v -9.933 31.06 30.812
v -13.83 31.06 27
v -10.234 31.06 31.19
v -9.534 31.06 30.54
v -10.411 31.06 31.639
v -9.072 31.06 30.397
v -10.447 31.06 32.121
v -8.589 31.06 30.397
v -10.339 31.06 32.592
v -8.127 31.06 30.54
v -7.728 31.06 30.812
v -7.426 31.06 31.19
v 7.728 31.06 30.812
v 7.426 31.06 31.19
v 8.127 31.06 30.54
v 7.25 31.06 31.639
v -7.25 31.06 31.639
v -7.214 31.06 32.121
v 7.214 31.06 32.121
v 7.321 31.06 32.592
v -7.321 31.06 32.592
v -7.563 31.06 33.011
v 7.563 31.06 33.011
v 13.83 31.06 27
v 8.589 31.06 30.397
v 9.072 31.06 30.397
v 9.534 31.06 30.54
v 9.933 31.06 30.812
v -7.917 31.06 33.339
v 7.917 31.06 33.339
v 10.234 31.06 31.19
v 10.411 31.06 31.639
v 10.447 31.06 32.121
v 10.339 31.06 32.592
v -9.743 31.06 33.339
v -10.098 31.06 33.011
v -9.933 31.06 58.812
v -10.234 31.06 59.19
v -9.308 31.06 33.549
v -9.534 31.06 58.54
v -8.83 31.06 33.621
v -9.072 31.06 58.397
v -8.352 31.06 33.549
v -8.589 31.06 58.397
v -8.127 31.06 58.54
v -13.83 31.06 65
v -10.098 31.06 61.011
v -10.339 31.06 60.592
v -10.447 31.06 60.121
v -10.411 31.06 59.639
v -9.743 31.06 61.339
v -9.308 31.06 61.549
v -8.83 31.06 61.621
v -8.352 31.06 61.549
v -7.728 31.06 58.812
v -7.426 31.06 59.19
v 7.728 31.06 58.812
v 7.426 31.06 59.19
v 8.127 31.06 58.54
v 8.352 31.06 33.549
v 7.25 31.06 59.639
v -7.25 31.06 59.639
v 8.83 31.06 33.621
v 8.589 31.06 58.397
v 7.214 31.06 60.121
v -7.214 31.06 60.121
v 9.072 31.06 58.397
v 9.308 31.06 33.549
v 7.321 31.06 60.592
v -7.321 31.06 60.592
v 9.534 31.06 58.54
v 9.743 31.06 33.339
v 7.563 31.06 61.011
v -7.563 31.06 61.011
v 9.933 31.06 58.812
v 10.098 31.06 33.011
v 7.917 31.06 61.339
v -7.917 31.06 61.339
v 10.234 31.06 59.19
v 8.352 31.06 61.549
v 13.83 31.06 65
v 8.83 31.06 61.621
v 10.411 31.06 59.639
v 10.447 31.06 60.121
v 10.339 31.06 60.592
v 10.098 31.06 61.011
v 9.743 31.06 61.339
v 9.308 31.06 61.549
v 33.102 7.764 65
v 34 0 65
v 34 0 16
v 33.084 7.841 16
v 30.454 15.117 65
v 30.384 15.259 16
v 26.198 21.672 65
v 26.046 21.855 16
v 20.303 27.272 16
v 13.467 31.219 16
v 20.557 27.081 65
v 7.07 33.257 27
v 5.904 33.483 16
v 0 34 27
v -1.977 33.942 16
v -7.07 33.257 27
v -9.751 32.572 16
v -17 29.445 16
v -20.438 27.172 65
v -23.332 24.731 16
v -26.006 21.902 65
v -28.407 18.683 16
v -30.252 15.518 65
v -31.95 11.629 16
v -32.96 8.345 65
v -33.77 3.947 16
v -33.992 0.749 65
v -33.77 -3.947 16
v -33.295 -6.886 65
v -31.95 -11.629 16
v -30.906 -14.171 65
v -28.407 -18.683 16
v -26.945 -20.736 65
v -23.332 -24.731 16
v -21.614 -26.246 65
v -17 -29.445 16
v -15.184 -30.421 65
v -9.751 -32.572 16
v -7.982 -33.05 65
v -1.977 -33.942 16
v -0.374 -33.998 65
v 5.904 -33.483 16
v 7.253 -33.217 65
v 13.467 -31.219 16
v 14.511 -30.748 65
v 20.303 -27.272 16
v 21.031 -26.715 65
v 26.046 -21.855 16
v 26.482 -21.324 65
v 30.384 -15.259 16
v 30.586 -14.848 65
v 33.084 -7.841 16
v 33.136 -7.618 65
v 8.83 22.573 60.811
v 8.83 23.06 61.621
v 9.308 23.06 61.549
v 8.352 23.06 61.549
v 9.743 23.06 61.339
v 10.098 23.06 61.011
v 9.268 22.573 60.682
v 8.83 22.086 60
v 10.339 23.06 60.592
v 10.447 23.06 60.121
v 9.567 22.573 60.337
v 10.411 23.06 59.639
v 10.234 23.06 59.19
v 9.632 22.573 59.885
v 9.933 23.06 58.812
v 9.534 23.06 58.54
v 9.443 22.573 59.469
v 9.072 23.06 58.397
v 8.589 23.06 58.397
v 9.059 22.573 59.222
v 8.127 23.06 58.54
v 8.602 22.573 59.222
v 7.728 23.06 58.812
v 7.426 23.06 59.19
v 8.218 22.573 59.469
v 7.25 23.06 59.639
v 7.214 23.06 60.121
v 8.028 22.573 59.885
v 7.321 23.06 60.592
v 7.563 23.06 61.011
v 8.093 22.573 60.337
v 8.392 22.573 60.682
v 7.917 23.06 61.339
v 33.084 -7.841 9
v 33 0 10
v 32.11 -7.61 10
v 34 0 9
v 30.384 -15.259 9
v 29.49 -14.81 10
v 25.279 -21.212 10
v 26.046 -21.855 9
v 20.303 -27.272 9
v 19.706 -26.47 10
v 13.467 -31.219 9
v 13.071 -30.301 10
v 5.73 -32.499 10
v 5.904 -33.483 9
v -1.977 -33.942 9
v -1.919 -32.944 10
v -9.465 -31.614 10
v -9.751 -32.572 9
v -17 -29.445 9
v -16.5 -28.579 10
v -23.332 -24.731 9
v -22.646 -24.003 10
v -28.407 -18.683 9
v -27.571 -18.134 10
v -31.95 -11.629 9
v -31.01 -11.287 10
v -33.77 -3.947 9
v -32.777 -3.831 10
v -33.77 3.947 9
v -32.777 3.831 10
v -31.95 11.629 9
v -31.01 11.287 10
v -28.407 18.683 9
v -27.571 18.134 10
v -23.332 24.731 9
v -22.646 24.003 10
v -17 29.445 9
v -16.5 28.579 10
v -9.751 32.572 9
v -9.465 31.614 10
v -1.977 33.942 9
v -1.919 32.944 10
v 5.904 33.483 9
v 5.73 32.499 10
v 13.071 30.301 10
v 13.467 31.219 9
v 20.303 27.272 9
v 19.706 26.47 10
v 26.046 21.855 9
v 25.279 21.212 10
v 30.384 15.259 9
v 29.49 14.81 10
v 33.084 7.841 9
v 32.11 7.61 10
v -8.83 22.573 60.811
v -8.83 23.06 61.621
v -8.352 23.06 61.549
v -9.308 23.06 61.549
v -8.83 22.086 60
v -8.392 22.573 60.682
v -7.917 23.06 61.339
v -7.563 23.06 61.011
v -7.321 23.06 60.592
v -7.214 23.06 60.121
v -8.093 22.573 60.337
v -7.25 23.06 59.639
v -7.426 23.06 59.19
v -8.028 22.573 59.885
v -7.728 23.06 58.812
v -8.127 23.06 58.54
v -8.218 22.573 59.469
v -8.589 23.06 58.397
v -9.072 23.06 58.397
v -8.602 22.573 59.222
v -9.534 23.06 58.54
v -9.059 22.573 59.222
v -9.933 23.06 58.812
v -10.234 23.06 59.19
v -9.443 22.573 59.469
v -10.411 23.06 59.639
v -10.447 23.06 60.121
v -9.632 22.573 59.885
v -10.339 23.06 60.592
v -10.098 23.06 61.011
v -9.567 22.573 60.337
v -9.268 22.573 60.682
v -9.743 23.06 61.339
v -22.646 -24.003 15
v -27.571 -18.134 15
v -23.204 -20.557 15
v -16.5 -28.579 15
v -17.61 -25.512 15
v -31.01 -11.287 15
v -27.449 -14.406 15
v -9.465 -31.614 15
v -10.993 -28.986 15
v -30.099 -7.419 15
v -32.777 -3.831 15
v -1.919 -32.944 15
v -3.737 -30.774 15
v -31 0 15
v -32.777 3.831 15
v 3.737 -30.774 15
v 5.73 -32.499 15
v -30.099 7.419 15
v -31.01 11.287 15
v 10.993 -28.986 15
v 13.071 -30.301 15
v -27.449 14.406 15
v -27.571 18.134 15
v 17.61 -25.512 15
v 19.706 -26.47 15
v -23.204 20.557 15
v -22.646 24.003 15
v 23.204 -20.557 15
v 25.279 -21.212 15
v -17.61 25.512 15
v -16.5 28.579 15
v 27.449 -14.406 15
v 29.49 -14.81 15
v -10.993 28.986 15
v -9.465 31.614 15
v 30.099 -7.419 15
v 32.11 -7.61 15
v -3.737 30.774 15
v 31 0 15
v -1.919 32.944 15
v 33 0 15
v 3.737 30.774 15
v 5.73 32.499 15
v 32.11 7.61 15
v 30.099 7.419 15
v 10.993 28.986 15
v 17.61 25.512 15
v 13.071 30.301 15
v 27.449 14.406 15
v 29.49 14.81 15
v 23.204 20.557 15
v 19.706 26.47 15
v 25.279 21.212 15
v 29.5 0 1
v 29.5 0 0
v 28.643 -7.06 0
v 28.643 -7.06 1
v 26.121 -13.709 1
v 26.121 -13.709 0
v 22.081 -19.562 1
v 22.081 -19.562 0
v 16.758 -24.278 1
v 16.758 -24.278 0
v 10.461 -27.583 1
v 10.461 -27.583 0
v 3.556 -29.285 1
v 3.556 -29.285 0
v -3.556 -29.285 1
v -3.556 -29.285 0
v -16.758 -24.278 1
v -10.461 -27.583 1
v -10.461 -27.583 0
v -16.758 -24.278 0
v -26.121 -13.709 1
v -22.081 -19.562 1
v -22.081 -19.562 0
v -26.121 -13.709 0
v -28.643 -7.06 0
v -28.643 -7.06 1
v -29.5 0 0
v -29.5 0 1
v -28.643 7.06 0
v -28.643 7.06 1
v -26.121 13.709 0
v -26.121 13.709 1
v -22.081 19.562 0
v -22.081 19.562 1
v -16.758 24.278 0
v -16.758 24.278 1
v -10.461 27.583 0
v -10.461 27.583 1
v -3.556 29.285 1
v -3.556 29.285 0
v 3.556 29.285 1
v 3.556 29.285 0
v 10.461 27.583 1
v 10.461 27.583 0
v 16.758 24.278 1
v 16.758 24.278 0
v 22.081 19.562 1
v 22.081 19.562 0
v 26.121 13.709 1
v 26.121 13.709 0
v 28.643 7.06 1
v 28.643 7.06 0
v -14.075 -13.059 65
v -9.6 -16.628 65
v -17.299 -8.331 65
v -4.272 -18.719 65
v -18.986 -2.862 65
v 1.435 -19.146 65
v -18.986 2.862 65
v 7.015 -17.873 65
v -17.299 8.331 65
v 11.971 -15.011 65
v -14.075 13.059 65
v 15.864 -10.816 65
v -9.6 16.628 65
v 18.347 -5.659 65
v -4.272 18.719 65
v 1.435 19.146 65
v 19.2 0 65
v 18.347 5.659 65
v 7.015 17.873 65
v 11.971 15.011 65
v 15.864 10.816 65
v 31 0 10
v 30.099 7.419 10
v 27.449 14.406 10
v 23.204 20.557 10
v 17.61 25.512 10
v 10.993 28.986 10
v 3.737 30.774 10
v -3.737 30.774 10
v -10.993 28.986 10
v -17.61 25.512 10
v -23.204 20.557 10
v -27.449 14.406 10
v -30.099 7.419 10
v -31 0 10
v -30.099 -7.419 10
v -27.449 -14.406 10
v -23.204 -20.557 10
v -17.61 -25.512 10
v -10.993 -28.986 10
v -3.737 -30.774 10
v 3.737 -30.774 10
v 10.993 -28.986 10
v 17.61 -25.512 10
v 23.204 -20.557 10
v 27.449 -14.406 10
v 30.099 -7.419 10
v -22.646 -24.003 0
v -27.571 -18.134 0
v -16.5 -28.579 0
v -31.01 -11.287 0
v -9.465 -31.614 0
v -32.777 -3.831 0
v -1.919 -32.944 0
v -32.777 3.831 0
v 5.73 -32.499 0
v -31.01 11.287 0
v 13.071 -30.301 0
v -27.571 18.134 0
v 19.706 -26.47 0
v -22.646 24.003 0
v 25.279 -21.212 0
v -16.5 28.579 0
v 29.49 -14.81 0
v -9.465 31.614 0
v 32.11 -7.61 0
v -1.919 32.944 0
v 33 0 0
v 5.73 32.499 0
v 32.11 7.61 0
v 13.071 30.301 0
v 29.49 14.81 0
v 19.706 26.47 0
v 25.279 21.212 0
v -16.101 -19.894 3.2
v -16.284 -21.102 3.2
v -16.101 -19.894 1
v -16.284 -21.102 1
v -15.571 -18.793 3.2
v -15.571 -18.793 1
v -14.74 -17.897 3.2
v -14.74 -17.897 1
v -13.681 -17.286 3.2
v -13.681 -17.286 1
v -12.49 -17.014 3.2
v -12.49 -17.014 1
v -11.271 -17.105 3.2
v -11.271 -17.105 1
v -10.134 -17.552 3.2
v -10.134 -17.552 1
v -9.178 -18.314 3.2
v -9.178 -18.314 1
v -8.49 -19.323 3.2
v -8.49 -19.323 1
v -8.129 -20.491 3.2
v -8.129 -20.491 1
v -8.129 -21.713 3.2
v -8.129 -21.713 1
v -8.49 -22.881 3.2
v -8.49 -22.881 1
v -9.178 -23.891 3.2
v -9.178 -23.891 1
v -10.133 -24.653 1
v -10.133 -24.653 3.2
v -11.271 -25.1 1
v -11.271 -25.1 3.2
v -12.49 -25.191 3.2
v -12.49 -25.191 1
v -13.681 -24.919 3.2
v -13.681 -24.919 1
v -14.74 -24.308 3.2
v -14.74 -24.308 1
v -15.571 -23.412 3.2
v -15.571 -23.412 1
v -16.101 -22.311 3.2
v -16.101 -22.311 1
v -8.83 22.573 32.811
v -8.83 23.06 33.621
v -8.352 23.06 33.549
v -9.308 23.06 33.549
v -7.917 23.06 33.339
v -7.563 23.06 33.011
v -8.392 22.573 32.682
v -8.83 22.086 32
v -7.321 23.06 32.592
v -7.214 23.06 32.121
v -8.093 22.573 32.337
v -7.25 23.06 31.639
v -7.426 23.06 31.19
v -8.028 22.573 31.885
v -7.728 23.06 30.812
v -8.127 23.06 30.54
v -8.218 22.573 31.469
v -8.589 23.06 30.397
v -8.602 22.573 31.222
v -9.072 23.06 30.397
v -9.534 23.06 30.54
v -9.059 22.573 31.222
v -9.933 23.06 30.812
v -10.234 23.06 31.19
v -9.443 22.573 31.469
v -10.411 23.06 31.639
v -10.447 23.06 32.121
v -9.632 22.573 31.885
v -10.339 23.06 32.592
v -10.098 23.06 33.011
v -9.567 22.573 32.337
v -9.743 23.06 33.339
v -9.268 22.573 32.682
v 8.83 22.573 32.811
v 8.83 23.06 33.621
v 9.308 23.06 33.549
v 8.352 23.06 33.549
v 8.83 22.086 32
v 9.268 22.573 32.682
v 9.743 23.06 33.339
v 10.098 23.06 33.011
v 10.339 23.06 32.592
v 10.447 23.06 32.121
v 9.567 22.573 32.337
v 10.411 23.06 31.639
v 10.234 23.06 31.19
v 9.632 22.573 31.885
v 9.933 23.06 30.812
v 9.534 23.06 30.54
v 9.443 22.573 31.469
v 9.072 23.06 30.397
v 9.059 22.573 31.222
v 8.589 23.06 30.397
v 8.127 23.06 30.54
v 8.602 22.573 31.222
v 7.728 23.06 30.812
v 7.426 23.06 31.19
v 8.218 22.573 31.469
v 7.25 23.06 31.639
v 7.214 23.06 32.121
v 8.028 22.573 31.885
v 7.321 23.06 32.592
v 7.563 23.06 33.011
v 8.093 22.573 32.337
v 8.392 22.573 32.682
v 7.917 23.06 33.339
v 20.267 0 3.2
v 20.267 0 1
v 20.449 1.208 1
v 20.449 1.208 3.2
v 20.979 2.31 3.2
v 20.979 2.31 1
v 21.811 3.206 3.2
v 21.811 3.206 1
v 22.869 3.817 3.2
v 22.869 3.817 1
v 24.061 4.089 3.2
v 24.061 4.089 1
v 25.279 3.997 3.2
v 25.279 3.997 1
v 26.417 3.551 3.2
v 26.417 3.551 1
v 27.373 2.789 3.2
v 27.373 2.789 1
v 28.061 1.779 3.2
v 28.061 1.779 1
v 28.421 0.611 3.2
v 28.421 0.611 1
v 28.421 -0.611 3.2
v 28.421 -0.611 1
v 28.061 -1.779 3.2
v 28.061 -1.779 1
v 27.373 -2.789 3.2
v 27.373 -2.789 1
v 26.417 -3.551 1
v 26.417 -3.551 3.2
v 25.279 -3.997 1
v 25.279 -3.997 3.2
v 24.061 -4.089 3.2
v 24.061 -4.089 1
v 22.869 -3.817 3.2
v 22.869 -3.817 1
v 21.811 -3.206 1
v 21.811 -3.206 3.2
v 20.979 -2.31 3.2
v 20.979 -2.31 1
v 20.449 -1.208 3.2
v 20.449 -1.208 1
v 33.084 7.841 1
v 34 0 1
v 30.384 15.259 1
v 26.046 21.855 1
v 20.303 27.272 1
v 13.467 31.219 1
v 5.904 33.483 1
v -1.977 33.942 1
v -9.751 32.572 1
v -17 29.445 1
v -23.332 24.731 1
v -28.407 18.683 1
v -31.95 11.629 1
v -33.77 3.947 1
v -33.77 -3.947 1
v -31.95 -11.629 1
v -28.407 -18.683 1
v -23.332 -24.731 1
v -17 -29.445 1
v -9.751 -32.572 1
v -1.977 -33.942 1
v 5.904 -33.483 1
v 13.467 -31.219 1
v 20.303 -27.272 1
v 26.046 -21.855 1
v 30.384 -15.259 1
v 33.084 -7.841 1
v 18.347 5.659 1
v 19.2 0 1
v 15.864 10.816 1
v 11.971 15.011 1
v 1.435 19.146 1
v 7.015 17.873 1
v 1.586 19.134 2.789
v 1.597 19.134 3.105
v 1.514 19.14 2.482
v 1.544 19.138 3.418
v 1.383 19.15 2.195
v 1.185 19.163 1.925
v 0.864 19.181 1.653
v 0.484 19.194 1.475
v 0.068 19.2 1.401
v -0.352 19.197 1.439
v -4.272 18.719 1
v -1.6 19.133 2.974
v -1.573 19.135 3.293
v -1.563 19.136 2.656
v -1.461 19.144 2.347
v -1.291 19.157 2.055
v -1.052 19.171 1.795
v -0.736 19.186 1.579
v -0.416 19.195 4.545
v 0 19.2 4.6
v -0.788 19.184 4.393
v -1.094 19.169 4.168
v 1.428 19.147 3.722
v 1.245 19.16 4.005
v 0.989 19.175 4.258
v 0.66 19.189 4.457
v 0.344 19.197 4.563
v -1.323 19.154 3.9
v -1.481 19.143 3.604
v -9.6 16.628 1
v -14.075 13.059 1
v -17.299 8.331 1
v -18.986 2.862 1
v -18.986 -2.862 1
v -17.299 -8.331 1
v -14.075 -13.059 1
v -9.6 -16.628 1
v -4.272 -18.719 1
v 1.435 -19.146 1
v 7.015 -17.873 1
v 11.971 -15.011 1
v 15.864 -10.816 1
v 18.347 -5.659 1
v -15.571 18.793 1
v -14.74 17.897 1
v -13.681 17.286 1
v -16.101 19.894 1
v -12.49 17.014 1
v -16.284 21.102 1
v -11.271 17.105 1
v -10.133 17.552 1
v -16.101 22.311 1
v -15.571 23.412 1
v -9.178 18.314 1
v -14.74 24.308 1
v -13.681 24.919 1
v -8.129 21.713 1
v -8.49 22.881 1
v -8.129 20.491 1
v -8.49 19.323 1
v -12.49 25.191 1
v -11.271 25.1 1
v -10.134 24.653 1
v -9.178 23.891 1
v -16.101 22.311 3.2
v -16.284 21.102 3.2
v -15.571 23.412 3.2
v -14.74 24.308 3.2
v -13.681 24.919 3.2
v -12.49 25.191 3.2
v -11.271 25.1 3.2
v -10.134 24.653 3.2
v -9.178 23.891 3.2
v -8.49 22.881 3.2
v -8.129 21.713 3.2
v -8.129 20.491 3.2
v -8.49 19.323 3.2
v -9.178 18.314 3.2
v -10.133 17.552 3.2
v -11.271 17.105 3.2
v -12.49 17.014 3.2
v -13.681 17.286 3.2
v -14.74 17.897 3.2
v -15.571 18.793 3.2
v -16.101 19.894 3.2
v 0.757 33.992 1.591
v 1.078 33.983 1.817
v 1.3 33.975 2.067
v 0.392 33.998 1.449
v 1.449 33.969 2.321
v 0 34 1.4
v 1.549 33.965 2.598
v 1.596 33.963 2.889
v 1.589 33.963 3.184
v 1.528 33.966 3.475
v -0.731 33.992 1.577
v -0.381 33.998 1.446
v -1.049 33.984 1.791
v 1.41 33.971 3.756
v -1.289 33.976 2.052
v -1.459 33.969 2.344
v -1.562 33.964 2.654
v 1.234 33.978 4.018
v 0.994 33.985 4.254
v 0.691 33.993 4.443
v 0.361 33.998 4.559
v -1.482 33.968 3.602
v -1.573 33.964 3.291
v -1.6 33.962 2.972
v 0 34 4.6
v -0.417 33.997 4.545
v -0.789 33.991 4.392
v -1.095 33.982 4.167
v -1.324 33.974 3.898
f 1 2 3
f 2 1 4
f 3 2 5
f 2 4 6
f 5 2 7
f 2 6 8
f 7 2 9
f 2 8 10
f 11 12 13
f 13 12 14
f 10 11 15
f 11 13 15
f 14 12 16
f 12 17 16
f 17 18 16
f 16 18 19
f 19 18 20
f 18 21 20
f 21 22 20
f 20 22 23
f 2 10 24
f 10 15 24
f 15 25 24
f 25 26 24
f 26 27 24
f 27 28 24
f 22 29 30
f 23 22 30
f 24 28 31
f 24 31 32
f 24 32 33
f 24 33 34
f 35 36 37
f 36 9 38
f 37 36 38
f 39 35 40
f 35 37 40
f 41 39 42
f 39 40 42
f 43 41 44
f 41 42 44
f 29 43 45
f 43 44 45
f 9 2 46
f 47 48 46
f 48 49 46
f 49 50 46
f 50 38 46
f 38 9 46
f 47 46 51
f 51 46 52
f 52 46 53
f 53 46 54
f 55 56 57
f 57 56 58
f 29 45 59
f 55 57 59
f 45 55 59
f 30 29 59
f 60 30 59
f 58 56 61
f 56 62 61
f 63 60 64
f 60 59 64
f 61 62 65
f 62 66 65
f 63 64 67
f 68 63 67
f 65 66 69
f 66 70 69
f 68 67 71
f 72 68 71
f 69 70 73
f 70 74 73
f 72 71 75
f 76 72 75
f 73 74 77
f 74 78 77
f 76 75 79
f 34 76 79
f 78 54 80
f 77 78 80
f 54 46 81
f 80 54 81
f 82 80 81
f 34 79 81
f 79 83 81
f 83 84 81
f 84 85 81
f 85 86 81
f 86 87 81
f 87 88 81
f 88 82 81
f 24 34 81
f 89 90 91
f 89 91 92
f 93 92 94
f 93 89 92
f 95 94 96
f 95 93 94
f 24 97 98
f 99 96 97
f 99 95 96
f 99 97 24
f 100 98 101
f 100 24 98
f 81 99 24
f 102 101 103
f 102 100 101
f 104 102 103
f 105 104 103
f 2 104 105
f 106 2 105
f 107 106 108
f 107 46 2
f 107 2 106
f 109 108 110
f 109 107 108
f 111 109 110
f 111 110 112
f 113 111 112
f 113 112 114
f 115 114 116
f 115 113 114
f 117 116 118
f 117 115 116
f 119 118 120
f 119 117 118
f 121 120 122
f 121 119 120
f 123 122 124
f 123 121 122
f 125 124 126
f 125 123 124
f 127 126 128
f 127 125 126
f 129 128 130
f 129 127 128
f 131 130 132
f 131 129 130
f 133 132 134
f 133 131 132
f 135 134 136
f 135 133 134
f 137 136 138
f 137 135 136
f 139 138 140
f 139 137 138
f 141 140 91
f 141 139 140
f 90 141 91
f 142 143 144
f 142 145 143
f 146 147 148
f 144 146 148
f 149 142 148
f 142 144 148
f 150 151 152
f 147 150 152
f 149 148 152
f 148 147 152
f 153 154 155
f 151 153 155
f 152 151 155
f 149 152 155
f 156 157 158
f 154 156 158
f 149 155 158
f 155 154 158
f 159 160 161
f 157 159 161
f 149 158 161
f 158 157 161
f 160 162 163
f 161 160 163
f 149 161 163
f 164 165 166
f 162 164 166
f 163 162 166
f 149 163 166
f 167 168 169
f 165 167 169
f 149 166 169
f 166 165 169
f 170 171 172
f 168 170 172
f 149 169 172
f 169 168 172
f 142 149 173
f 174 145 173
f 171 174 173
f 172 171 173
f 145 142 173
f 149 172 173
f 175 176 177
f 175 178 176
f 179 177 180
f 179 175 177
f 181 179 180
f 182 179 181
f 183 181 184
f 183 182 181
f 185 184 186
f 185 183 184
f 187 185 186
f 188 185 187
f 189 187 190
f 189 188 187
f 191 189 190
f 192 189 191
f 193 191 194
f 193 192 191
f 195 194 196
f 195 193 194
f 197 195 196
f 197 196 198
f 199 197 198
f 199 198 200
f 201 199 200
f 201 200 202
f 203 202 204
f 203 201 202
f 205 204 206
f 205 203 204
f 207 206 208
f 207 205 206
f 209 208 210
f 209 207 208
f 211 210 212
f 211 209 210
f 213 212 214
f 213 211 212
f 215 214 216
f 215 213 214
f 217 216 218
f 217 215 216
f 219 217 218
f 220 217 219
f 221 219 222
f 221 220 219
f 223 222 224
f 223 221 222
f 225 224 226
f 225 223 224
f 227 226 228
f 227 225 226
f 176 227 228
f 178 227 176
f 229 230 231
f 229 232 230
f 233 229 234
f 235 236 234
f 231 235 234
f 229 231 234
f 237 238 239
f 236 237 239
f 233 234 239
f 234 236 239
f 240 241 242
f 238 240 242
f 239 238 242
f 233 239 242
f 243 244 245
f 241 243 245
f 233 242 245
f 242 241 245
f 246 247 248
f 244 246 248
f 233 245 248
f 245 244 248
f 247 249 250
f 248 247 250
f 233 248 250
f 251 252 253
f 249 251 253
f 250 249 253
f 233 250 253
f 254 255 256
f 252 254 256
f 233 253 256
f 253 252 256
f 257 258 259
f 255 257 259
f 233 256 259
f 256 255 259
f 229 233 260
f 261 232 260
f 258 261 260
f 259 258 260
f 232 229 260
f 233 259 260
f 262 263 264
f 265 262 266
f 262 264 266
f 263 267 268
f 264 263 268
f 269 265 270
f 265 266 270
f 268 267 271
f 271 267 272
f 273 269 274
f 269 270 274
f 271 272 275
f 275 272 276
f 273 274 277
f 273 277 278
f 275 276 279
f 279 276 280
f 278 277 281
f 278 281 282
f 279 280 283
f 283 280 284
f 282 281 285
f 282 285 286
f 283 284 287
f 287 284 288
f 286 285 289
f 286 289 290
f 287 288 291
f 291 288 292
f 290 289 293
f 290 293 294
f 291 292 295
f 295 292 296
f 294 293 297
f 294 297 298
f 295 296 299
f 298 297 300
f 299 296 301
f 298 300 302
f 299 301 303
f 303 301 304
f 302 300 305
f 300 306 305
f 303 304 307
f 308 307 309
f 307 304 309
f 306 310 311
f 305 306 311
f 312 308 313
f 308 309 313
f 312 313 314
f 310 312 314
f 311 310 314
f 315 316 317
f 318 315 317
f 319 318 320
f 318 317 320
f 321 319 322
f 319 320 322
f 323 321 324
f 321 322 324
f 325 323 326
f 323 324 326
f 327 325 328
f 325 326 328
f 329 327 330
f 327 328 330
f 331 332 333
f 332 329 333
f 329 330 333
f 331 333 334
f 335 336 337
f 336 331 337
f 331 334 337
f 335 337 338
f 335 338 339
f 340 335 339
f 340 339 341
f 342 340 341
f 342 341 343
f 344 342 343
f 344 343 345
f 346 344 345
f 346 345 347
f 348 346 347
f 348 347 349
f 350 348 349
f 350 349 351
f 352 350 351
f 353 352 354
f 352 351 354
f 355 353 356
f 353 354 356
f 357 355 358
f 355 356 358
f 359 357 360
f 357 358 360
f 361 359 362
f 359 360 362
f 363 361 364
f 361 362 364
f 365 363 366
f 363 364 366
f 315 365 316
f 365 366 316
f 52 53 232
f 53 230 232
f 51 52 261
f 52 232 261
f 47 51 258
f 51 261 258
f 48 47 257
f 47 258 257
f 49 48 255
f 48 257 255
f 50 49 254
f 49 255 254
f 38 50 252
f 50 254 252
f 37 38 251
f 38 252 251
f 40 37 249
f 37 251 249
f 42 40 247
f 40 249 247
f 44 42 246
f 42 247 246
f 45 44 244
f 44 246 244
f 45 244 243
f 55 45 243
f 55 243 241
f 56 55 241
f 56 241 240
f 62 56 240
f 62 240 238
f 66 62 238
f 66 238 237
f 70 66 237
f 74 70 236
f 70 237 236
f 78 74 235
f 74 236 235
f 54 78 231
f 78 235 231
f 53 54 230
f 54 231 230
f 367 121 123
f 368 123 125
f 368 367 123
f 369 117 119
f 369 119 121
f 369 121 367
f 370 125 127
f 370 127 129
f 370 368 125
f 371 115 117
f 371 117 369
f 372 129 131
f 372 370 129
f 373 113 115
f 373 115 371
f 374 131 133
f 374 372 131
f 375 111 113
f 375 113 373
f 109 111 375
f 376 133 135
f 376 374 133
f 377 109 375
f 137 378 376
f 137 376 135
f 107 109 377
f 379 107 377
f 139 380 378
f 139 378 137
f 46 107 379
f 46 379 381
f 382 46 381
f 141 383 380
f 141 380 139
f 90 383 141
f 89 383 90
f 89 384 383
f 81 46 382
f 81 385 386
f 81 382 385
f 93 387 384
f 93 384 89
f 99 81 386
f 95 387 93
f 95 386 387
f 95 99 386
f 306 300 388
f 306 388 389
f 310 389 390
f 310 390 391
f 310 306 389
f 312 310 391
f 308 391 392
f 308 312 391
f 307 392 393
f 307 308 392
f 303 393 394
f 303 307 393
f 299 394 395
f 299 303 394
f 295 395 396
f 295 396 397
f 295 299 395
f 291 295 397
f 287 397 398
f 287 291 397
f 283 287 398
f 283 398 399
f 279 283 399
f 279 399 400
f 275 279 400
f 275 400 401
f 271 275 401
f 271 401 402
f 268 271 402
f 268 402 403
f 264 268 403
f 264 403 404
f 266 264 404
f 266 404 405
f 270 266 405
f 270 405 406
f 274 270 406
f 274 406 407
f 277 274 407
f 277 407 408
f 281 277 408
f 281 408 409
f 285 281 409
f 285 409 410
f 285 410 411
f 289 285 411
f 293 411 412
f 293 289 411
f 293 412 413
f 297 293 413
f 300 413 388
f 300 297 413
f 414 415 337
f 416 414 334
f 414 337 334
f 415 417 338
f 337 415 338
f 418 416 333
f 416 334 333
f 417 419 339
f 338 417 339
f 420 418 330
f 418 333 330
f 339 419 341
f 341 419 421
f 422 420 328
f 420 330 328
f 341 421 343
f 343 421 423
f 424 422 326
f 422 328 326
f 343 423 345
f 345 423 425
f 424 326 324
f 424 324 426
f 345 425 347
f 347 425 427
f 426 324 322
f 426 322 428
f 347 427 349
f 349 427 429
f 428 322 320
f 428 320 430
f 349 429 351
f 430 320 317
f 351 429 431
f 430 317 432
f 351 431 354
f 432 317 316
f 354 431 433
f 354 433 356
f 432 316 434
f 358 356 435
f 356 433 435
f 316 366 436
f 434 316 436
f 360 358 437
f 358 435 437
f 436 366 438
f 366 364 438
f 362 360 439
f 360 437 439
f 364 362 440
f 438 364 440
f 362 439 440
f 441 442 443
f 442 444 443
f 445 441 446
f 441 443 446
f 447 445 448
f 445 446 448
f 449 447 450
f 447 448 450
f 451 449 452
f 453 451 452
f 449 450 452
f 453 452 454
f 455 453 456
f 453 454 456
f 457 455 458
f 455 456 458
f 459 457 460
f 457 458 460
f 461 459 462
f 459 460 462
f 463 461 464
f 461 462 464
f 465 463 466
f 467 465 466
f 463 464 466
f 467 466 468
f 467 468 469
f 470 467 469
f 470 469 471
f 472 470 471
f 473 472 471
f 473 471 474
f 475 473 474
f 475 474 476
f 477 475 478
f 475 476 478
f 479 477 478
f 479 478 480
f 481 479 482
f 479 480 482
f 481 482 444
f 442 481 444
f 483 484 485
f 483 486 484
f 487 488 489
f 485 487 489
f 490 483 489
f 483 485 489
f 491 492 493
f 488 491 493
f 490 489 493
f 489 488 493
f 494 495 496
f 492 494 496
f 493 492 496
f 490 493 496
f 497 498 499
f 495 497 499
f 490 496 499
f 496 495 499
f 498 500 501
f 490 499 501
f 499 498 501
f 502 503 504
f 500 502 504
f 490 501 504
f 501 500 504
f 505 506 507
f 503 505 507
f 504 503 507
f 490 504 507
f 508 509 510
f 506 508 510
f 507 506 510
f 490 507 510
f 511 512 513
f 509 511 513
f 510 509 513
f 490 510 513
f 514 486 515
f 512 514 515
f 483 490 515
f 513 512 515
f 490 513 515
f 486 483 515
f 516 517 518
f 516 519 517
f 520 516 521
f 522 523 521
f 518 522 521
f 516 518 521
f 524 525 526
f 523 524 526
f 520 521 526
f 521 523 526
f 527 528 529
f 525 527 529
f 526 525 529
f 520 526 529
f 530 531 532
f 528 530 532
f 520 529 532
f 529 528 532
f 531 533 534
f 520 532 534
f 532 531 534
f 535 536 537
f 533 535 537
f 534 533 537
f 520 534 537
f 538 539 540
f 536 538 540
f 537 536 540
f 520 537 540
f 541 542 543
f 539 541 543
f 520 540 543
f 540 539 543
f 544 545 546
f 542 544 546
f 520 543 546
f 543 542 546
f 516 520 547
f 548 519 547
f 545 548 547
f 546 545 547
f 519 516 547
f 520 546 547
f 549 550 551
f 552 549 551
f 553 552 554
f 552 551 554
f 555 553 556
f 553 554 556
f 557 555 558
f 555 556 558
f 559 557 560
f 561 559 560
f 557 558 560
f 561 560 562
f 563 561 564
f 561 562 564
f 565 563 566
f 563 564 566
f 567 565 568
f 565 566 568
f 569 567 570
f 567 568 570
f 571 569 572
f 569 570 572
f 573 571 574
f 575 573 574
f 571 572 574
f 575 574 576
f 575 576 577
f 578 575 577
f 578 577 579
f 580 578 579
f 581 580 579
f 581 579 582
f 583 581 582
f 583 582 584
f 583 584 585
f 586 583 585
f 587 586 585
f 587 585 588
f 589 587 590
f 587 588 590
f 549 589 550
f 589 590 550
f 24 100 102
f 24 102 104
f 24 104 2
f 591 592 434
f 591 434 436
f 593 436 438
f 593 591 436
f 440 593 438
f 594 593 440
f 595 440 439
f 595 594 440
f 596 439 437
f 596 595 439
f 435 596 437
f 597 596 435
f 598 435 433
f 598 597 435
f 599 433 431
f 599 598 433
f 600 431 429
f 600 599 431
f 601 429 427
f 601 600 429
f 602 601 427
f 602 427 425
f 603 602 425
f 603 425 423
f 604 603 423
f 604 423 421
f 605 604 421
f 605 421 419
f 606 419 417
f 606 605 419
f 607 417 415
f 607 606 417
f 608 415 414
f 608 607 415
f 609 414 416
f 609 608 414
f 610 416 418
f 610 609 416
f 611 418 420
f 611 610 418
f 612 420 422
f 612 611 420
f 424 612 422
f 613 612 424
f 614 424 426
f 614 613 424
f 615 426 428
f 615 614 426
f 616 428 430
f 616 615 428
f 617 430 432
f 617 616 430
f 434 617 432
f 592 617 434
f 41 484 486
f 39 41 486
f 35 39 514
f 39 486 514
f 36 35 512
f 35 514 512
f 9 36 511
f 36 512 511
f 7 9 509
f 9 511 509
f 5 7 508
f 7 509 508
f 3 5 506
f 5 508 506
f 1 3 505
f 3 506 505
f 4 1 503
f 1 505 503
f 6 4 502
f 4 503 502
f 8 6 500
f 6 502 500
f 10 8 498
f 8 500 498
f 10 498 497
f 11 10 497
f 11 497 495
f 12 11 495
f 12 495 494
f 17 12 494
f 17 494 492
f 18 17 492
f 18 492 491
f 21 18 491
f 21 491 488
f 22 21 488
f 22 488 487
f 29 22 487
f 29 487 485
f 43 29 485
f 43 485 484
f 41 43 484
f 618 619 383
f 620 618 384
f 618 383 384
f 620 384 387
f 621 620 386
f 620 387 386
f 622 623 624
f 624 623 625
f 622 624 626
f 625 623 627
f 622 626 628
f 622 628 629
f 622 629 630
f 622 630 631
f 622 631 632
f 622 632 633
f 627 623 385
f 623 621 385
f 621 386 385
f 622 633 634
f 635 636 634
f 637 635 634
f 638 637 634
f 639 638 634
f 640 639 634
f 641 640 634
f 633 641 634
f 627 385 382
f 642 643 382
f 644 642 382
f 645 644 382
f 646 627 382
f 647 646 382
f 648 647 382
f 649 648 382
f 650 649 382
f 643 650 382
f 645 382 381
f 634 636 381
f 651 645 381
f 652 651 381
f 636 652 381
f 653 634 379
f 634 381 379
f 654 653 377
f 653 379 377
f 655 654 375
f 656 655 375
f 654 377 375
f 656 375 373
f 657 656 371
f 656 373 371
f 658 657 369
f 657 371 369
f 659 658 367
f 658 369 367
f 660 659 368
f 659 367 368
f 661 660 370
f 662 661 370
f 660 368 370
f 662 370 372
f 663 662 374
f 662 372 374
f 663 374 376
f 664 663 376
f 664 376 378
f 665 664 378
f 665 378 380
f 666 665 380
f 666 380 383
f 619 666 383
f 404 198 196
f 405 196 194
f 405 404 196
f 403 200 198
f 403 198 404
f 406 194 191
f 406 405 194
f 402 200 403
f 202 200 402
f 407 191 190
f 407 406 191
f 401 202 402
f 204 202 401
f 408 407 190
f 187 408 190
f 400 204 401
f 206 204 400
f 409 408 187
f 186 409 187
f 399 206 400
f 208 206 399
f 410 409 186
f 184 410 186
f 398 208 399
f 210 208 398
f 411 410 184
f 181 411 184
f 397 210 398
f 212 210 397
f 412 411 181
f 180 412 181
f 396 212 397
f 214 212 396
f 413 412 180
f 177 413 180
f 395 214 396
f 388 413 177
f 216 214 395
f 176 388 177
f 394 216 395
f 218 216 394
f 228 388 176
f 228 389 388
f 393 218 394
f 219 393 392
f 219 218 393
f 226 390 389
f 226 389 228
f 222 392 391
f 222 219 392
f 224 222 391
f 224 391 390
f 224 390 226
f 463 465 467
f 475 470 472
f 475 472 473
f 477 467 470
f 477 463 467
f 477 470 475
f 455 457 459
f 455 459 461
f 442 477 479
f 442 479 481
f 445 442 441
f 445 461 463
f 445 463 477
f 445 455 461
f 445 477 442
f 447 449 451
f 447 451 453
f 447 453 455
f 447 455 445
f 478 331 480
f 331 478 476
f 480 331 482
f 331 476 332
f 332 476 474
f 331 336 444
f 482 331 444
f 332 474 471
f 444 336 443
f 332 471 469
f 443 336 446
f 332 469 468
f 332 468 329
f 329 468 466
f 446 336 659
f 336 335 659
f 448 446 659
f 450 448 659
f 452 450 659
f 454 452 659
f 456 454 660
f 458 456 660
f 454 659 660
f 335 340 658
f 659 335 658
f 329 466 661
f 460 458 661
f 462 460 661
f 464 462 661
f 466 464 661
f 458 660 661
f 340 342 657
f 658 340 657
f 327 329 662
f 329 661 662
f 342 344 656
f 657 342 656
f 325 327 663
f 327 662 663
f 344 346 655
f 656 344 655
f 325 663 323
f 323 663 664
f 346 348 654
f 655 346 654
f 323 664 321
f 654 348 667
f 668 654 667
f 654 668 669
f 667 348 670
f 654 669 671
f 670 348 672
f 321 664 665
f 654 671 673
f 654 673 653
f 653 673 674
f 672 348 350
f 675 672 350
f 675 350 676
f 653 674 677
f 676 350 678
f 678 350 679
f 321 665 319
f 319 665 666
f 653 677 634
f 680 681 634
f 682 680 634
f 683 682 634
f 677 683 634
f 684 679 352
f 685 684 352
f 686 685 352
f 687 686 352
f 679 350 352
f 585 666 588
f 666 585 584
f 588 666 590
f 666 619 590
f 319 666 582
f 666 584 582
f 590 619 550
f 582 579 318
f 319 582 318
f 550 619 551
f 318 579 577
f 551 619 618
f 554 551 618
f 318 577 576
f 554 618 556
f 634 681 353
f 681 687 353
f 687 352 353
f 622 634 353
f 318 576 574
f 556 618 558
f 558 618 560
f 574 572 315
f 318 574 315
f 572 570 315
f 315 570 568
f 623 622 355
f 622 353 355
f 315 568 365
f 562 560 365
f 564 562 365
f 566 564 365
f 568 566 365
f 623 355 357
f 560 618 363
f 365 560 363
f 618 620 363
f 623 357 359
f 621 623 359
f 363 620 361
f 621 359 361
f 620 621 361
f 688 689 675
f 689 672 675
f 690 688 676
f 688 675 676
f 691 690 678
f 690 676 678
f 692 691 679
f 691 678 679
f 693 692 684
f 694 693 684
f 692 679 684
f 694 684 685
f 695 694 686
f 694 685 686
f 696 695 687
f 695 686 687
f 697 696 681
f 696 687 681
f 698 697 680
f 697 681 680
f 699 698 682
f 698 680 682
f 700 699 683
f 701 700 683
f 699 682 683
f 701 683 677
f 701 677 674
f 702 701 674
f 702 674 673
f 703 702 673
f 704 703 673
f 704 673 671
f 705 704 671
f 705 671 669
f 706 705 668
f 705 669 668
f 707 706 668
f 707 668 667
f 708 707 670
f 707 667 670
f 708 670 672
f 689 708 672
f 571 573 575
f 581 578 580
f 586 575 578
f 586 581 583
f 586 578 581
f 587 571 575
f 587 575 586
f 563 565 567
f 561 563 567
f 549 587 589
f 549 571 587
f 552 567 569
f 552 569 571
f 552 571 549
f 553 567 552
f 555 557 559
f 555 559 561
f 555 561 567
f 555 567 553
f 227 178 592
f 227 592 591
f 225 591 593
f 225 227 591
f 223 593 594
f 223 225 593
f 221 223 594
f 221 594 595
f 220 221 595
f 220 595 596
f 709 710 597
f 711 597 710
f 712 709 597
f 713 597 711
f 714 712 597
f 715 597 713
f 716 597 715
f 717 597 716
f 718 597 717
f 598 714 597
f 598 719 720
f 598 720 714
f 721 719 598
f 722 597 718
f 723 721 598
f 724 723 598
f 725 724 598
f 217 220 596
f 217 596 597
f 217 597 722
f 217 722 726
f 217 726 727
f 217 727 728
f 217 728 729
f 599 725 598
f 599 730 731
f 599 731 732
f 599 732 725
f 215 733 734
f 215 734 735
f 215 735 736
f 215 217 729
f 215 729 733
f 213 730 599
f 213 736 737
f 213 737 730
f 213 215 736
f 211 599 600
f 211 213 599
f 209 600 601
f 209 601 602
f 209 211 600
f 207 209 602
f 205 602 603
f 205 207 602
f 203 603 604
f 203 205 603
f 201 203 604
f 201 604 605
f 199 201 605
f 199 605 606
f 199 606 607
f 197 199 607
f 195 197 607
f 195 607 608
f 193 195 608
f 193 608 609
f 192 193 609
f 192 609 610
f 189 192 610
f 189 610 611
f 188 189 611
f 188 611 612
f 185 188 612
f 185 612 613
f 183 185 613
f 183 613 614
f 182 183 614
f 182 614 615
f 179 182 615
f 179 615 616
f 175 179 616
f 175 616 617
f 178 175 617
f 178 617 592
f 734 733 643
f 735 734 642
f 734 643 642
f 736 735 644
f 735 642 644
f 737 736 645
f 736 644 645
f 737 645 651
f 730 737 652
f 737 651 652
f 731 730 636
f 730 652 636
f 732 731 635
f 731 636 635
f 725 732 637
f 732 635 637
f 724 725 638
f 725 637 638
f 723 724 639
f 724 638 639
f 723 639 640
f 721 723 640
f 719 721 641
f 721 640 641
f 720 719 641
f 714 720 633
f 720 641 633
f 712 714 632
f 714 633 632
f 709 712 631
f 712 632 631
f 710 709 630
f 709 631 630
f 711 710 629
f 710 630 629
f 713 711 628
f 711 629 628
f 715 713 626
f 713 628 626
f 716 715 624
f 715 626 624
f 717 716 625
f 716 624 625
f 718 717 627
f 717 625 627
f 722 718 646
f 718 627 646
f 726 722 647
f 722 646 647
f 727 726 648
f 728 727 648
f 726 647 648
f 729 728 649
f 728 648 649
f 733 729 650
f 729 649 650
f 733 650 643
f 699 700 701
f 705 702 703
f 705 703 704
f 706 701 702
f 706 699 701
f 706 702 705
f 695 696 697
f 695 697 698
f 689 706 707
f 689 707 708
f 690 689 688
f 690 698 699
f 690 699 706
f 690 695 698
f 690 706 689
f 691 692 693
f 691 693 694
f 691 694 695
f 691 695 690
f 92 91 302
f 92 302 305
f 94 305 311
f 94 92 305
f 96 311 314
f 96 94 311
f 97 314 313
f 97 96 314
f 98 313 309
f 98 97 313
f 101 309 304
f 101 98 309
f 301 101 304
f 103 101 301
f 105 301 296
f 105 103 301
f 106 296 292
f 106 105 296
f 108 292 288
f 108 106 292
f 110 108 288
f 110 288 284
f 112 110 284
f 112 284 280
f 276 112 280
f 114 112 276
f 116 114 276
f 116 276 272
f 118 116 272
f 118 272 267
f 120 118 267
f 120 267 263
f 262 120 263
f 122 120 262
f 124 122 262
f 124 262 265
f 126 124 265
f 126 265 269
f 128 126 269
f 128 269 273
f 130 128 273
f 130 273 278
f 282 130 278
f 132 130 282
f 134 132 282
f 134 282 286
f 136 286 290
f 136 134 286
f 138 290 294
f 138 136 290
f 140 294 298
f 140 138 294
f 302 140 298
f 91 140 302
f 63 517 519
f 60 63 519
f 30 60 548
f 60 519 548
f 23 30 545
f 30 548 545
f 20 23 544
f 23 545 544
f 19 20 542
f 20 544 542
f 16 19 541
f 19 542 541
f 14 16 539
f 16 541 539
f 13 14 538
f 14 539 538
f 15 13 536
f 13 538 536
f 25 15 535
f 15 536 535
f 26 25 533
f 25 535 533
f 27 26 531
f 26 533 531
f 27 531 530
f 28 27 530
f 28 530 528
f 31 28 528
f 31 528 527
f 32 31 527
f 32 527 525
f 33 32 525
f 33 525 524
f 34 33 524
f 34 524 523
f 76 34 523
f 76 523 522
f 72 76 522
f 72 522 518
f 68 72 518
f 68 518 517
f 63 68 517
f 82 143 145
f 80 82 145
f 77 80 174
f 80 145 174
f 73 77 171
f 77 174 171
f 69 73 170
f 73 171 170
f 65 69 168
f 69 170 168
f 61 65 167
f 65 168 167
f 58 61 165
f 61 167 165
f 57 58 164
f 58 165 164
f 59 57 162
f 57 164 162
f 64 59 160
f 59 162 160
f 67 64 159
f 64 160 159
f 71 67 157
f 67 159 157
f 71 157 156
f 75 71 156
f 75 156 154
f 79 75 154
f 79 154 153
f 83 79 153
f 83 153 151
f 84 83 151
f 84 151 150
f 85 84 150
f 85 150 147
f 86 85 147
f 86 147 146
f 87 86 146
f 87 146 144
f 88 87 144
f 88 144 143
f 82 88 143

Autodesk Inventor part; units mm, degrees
sketch "Esboço2" plane through (0, 0, 0) normal (0, 1, 0) x (-1, 0, 0)
  line L0 (0, 0) -> (-19.2, 0) construction
  line L1 (-34, 1) -> (-34, 9)
  line L2 (-33, 10) -> (-31, 10)
  line L3 (-31, 10) -> (-31, 15)
  line L4 (-31, 15) -> (-33, 15)
  line L5 (-34, 16) -> (-34, 65)
  line L6 (0, 0) -> (0, 69.2361) construction
  line L7 (-34, 65) -> (-19.2, 65)
  line L8 (-19.2, 0) -> (-19.2, 1)
  line L9 (-19.2, 1) -> (-29.5, 1)
  line L10 (-29.5, 1) -> (-29.5, 0)
  line L11 (-29.5, 0) -> (-33, 0)
  line L12 (-19.2, 1) -> (-19.2, 65)
  line L13 (-34, 16) -> (-33, 15)
  line L14 (-34, 9) -> (-33, 10)
  line L15 (-34, 1) -> (-33, 0)
  point P0 (-34, 0)
  point P1 (-34, 10)
  point P2 (-34, 15)
  dimension "d1" = 19.2
  dimension "d6" = 14.8
  dimension "d7" = 10
  dimension "d8" = 3
  dimension "d9" = 5
  dimension "d11" = 50
  dimension "d14" = 1
  dimension "d15" = 10.3
  dimension "d16" = 1
  dimension "d17" = 1
  dimension "d18" = 1
  dimension "d19" = 1
  dimension "d20" = 1
  dimension "d21" = 1
revolve "Revolução1" add sketch "Esboço2" angle 360 about axis through (0, 0, 0) along (0, 0, 1)
ref_plane "Plano de trabalho1" through (0, 0, 65) normal (0, 0, 1) x (1, 0, 0)
sketch "Esboço3" plane through (0, 0, 65) normal (0, 0, 1) x (1, 0, 0)
  line L0 (0, 0) -> (0, 19.06) construction
  line L1 (0, 19.06) -> (0, 31.06) construction
  line L2 (0, 31.06) -> (33, 31.06) construction
  line L3 (33, 31.06) -> (33, 44.9163)
  line L4 (33, 44.9163) -> (-33, 44.9163)
  line L5 (-33, 44.9163) -> (-33, 31.06)
  line L6 (-33, 31.06) -> (33, 31.06)
  dimension "d30" = 12
  dimension "d31" = 19.06
extrude "Extrusão1" cut sketch "Esboço3" against normal blind 38
ref_plane "Plano de trabalho2" through (-13.8302, 31.06, 65) normal (0, 1, 0) x (1, 0, 0)
sketch "Esboço5" plane through (-13.8302, 31.06, 65) normal (0, 1, 0) x (1, 0, 0)
  line L0 (0, 0) -> (0, 38) projected
  line L1 (27.6605, 0) -> (0, 0) projected
  line L2 (27.6605, 38) -> (27.6605, 0) projected
  line L3 (5, 5) -> (5, 33)
  line L4 (5, 33) -> (22.6605, 33)
  line L5 (22.6605, 33) -> (22.6605, 5)
  line L6 (22.6605, 5) -> (5, 5)
  line L7 (27.6605, 38) -> (0, 38) projected
  point P0 (13.8302, 65)
  dimension "d33" = 5
hole "Furo1" at (8.8302, 31.06, 60) at (8.8302, 31.06, 32) at (-8.8302, 31.06, 32) at (-8.8302, 31.06, 60) direction (0, -1, 0) diameter 3.242 depth 8 tip angle 118 thread size "M4x0.7" class "6H" standard "ISO Metric profile"
ref_plane "Plano de trabalho3" through (0, 0, 1) normal (0, 0, -1) x (-1, 0, 0)
sketch "Esboço7" plane through (0, 0, 1) normal (0, 0, -1) x (-1, 0, 0)
  circle A0 centre (0, 0) radius 19.2 construction
  circle A1 centre (0, 0) radius 29.2679 construction
  circle A2 centre (0, 0) radius 19.2 projected
  line L0 (-19.2, 0) -> (-24.367, 0) construction
  circle A3 centre (-24.367, 0) radius 4.1
  circle A4 centre (12.1835, -21.1024) radius 4.1
  circle A5 centre (12.1835, 21.1024) radius 4.1
  dimension "d42" = 5.167
  dimension "d43" = 8.2
  dimension "d46" = 360
extrude "Extrusão2" cut sketch "Esboço7" against normal blind 2.2 contours A3 | A4 | A5
ref_plane "Plano de trabalho4" through (-13.8302, 31.06, 65) normal (0, 1, 0) x (1, 0, 0)
ref_plane "Plano de trabalho5" through (0, 34, 27) normal (0, 1, 0) x (-1, 0, 0)
sketch "Esboço10" plane through (0, 34, 27) normal (0, 1, 0) x (-1, 0, 0)
  line L0 (-13.8302, 0) -> (13.8302, 0) projected
  line L1 (0, 0) -> (0, -27) construction
  line L2 (0, -27) -> (0, -24) construction
  dimension "d53" = 3
hole "Furo2" at (0, 34, 3) direction (0, -1, 0) diameter 3.2 depth 17.2 tip angle 118
equation "\"d17\" = d16"
equation "\"d18\" = d16"
equation "\"d19\" = d18"
equation "\"d20\" = d16"
equation "\"d21\" = d20"
properties part number "bocal_de_aquecimento" material "Alumínio 6061"
